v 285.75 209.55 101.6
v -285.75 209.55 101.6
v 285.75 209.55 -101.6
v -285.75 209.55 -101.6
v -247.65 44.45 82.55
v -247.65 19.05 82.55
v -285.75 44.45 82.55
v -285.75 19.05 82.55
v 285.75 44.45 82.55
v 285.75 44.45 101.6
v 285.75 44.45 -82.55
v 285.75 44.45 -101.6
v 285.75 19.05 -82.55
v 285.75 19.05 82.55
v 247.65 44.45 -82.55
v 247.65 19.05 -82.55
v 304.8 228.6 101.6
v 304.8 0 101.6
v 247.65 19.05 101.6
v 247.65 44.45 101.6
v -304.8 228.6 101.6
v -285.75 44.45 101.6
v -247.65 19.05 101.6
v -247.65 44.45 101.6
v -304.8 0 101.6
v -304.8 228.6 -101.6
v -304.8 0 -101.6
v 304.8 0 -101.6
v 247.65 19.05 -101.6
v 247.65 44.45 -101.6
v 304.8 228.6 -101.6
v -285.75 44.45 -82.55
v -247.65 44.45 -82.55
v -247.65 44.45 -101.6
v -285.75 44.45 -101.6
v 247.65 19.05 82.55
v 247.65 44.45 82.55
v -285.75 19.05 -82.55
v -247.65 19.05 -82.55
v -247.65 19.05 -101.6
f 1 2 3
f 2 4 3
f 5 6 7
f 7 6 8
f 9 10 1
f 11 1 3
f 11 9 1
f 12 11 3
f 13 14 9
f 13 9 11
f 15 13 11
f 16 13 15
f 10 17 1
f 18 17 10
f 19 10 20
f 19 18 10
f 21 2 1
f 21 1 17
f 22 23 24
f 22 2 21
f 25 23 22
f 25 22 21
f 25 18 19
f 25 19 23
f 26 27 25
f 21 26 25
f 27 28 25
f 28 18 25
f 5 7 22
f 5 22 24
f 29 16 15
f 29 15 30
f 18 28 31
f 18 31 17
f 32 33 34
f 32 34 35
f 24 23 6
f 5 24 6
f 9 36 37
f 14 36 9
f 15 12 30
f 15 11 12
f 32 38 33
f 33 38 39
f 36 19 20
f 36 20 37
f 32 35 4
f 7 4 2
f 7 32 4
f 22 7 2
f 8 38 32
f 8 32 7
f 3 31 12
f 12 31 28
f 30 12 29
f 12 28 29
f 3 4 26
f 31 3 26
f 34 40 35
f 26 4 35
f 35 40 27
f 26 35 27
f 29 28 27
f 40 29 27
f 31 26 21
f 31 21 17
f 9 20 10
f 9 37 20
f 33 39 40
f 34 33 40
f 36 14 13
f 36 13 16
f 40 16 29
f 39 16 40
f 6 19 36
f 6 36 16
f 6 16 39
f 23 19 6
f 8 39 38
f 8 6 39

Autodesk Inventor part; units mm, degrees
ref_plane "YZ Plane" through (0, 0, 0) normal (1, 0, 0) x (0, 1, 0)
ref_plane "XZ Plane" through (0, 0, 0) normal (0, 1, 0) x (-1, 0, 0)
ref_plane "XY Plane" through (0, 0, 0) normal (0, 0, 1) x (1, 0, 0)
sketch "Sketch1" plane through (0, 0, 0) normal (0, 1, 0) x (-1, 0, 0)
  line L0 (-304.8, 101.6) -> (304.8, 101.6)
  line L1 (304.8, 101.6) -> (304.8, -101.6)
  line L2 (304.8, -101.6) -> (-304.8, -101.6)
  line L3 (-304.8, -101.6) -> (-304.8, 101.6)
  line L4 (-304.8, 101.6) -> (304.8, -101.6) construction
  line L5 (304.8, 101.6) -> (-304.8, -101.6) construction
  point P0 (0, 0)
  dimension "length" = 609.6
  dimension "width" = 203.2
extrude "Extrusion1" add sketch "Sketch1" along normal blind 19.05
sketch "Sketch2" plane through (0, 19.05, 0) normal (0, 1, 0) x (1, 0, 0)
  line L0 (-304.8, -101.6) -> (304.8, -101.6) projected
  line L1 (304.8, 101.6) -> (-304.8, 101.6) projected
  line L2 (-304.8, -101.6) -> (-304.8, 101.6)
  line L3 (-304.8, 101.6) -> (-285.75, 101.6)
  line L4 (-285.75, 101.6) -> (-285.75, -101.6)
  line L5 (-285.75, -101.6) -> (-304.8, -101.6)
  point P0 (0, 0)
  dimension "d4" = 19.05
extrude "Extrusion2" add sketch "Sketch2" along normal blind 190.5
mirror "Mirror2" about plane through (0, 0, 0) normal (1, 0, 0) of "Extrusion2"
sketch "Sketch3" plane through (0, 19.05, 0) normal (0, 1, 0) x (1, 0, 0)
  line L0 (-285.75, -101.6) -> (-247.65, -101.6)
  line L1 (-247.65, -101.6) -> (-247.65, -82.55)
  line L2 (-247.65, -82.55) -> (-285.75, -82.55)
  line L3 (-285.75, -82.55) -> (-285.75, -101.6)
  line L4 (-285.75, -101.6) -> (285.75, -101.6)
  line L5 (285.75, -101.6) -> (247.65, -101.6)
  line L6 (247.65, -101.6) -> (247.65, -82.55)
  line L7 (247.65, -82.55) -> (285.75, -82.55)
  line L8 (285.75, -82.55) -> (285.75, -101.6)
  point P0 (0, 0)
  dimension "d7" = 19.05
  dimension "d8" = 19.05
  dimension "d12" = 38.1
  dimension "d14" = 38.1
extrude "Extrusion3" add sketch "Sketch3" along normal blind 25.4
mirror "Mirror3" about plane through (0, 0, 0) normal (0, 0, 1) of "Extrusion3"
sketch "Sketch5" plane through (0, 209.55, 0) normal (0, 1, 0) x (1, 0, 0)
  line L0 (304.8, -101.6) -> (-304.8, -101.6) projected
  line L1 (304.8, 101.6) -> (304.8, -101.6) projected
  line L2 (-304.8, -101.6) -> (304.8, -101.6)
  line L3 (304.8, -101.6) -> (304.8, 101.6)
  line L4 (304.8, 101.6) -> (-304.8, 101.6)
  line L5 (-304.8, 101.6) -> (-304.8, -101.6)
  point P0 (0, 0)
extrude "Extrusion4" add sketch "Sketch5" along normal blind 19.05
equation "\"d4\" = thickness"
equation "\"d7\" = thickness"
equation "\"d8\" = thickness"
equation "\"d14\" = d12"
equation "\"d15\" = thickness"
equation "\"thickness\" = 19.05"
properties part number "cabinet" material "Pine, Radiata"
